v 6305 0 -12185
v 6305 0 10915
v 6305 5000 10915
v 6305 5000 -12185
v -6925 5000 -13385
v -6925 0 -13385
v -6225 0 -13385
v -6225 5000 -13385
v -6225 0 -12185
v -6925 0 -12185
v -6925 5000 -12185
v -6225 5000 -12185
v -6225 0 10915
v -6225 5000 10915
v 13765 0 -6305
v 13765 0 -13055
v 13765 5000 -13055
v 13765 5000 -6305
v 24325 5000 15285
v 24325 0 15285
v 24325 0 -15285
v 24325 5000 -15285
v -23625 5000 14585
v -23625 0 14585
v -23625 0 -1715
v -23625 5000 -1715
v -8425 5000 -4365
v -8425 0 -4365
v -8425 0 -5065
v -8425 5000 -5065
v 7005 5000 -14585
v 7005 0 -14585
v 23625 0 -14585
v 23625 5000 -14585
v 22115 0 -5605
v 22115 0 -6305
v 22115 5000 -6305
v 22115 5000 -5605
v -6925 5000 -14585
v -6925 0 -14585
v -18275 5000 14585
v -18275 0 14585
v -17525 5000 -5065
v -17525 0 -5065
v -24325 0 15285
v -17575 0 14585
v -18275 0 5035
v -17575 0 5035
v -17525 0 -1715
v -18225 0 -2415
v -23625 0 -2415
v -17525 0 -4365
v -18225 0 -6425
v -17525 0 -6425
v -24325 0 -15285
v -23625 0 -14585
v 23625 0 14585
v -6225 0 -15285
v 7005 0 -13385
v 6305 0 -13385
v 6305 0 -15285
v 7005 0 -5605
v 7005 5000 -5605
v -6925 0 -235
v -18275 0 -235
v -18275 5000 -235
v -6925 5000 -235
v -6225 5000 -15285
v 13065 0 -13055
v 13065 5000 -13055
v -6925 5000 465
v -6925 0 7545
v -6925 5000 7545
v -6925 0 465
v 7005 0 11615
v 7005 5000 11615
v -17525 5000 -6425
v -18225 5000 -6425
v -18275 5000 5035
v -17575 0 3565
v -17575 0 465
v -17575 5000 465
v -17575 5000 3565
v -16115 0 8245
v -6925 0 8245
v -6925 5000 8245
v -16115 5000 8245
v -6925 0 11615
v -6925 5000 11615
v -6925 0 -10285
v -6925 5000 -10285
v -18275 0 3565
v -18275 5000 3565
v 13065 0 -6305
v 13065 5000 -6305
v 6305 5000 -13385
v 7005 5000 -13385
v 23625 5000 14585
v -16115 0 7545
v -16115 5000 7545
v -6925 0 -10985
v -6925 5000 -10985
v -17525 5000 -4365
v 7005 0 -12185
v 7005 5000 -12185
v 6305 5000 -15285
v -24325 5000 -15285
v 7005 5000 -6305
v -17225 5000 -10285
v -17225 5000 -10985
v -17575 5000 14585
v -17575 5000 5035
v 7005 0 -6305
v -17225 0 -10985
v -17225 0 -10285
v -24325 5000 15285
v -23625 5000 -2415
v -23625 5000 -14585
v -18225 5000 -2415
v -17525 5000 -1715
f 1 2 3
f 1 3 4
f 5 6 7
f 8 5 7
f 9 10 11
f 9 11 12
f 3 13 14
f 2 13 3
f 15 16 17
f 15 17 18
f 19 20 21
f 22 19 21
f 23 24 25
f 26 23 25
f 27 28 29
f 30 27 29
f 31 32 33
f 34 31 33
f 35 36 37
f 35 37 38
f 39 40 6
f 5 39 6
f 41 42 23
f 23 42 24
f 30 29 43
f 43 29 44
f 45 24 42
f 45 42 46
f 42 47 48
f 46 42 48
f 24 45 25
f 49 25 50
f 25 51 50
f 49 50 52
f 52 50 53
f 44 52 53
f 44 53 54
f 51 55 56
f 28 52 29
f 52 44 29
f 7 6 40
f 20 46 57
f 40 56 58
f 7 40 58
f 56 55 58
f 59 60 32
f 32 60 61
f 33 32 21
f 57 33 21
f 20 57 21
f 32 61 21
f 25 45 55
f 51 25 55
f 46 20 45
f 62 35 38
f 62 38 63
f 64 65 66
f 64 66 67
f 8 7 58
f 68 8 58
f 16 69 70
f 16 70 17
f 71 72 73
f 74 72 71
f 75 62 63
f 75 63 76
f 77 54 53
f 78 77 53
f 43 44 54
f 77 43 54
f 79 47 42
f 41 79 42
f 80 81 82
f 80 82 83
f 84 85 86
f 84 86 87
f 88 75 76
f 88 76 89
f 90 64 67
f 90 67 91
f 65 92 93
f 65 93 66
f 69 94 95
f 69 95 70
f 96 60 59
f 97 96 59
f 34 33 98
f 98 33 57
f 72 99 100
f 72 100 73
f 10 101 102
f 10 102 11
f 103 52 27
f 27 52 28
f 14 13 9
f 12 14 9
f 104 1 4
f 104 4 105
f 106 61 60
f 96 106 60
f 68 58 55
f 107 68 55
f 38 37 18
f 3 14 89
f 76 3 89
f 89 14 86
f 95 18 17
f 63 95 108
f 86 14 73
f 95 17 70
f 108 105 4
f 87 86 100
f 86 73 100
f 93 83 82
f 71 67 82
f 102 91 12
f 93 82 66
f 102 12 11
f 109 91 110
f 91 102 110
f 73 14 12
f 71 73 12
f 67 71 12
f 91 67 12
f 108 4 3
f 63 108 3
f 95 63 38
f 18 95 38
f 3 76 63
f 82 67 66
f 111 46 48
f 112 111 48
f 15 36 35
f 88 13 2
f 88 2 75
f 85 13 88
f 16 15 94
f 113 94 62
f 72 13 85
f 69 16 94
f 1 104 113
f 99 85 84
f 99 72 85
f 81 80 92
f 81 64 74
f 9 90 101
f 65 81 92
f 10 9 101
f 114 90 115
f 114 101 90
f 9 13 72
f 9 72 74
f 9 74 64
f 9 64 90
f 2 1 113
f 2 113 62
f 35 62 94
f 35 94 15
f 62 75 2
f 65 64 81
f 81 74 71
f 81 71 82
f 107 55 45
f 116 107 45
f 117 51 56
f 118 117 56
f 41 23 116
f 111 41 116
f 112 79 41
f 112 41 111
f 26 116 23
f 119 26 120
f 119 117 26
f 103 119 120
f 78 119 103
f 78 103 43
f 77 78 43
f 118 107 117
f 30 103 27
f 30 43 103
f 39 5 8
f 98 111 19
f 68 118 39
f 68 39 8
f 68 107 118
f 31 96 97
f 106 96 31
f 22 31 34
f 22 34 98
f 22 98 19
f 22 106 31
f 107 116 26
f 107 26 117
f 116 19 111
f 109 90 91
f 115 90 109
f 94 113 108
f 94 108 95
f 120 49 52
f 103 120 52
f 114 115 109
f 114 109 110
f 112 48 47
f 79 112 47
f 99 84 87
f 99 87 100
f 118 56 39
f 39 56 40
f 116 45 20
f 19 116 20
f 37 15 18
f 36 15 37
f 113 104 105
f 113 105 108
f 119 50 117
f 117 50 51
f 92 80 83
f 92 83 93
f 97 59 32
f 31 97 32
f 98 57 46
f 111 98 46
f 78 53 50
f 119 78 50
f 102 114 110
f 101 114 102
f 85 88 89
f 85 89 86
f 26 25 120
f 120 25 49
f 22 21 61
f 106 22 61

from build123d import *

# Parameters (mm, degrees)
WALLS_5M_DEPTH   = 5000
WALLS_5M_2_DEPTH = 5000


with BuildPart() as part:
    # hyperport_plan → walls_5m (new body)
    with BuildSketch(Plane(origin=(0, 0, 0), x_dir=(1, 0, 0), z_dir=(0, 1, 0))):
        Polygon((-6225, 15285), (-24325, 15285), (-24325, -15285), (24325, -15285), (24325, 15285), (6305, 15285), (6305, 13385), (7005, 13385), (7005, 14585), (23625, 14585), (23625, -14585), (-17575, -14585), (-17575, -5035), (-18275, -5035), (-18275, -14585), (-23625, -14585), (-23625, 1715), (-17525, 1715), (-17525, 4365), (-8425, 4365), (-8425, 5065), (-17525, 5065), (-17525, 6425), (-18225, 6425), (-18225, 2415), (-23625, 2415), (-23625, 14585), (-6925, 14585), (-6925, 13385), (-6225, 13385), align=None)
    extrude(amount=WALLS_5M_DEPTH)


with BuildPart() as body_2:
    # hyperport_plan → walls_5m 2 (new body)
    with BuildSketch(Plane(origin=(0, 0, 0), x_dir=(1, 0, 0), z_dir=(0, 1, 0))):
        Polygon((-6225, 12185), (-6225, 10985), (-6225, -10915), (6305, -10915), (6305, 12185), (7005, 12185), (7005, 6305), (13065, 6305), (13065, 13055), (13765, 13055), (13765, 6305), (22115, 6305), (22115, 5605), (7005, 5605), (7005, -11615), (-6925, -11615), (-6925, -8245), (-16115, -8245), (-16115, -7545), (-6925, -7545), (-6925, -465), (-17575, -465), (-17575, -3565), (-18275, -3565), (-18275, 235), (-6925, 235), (-6925, 10285), (-17225, 10285), (-17225, 10985), (-6925, 10985), (-6925, 12185), align=None)
    extrude(amount=WALLS_5M_2_DEPTH)


solid = Compound([part.part, body_2.part])
